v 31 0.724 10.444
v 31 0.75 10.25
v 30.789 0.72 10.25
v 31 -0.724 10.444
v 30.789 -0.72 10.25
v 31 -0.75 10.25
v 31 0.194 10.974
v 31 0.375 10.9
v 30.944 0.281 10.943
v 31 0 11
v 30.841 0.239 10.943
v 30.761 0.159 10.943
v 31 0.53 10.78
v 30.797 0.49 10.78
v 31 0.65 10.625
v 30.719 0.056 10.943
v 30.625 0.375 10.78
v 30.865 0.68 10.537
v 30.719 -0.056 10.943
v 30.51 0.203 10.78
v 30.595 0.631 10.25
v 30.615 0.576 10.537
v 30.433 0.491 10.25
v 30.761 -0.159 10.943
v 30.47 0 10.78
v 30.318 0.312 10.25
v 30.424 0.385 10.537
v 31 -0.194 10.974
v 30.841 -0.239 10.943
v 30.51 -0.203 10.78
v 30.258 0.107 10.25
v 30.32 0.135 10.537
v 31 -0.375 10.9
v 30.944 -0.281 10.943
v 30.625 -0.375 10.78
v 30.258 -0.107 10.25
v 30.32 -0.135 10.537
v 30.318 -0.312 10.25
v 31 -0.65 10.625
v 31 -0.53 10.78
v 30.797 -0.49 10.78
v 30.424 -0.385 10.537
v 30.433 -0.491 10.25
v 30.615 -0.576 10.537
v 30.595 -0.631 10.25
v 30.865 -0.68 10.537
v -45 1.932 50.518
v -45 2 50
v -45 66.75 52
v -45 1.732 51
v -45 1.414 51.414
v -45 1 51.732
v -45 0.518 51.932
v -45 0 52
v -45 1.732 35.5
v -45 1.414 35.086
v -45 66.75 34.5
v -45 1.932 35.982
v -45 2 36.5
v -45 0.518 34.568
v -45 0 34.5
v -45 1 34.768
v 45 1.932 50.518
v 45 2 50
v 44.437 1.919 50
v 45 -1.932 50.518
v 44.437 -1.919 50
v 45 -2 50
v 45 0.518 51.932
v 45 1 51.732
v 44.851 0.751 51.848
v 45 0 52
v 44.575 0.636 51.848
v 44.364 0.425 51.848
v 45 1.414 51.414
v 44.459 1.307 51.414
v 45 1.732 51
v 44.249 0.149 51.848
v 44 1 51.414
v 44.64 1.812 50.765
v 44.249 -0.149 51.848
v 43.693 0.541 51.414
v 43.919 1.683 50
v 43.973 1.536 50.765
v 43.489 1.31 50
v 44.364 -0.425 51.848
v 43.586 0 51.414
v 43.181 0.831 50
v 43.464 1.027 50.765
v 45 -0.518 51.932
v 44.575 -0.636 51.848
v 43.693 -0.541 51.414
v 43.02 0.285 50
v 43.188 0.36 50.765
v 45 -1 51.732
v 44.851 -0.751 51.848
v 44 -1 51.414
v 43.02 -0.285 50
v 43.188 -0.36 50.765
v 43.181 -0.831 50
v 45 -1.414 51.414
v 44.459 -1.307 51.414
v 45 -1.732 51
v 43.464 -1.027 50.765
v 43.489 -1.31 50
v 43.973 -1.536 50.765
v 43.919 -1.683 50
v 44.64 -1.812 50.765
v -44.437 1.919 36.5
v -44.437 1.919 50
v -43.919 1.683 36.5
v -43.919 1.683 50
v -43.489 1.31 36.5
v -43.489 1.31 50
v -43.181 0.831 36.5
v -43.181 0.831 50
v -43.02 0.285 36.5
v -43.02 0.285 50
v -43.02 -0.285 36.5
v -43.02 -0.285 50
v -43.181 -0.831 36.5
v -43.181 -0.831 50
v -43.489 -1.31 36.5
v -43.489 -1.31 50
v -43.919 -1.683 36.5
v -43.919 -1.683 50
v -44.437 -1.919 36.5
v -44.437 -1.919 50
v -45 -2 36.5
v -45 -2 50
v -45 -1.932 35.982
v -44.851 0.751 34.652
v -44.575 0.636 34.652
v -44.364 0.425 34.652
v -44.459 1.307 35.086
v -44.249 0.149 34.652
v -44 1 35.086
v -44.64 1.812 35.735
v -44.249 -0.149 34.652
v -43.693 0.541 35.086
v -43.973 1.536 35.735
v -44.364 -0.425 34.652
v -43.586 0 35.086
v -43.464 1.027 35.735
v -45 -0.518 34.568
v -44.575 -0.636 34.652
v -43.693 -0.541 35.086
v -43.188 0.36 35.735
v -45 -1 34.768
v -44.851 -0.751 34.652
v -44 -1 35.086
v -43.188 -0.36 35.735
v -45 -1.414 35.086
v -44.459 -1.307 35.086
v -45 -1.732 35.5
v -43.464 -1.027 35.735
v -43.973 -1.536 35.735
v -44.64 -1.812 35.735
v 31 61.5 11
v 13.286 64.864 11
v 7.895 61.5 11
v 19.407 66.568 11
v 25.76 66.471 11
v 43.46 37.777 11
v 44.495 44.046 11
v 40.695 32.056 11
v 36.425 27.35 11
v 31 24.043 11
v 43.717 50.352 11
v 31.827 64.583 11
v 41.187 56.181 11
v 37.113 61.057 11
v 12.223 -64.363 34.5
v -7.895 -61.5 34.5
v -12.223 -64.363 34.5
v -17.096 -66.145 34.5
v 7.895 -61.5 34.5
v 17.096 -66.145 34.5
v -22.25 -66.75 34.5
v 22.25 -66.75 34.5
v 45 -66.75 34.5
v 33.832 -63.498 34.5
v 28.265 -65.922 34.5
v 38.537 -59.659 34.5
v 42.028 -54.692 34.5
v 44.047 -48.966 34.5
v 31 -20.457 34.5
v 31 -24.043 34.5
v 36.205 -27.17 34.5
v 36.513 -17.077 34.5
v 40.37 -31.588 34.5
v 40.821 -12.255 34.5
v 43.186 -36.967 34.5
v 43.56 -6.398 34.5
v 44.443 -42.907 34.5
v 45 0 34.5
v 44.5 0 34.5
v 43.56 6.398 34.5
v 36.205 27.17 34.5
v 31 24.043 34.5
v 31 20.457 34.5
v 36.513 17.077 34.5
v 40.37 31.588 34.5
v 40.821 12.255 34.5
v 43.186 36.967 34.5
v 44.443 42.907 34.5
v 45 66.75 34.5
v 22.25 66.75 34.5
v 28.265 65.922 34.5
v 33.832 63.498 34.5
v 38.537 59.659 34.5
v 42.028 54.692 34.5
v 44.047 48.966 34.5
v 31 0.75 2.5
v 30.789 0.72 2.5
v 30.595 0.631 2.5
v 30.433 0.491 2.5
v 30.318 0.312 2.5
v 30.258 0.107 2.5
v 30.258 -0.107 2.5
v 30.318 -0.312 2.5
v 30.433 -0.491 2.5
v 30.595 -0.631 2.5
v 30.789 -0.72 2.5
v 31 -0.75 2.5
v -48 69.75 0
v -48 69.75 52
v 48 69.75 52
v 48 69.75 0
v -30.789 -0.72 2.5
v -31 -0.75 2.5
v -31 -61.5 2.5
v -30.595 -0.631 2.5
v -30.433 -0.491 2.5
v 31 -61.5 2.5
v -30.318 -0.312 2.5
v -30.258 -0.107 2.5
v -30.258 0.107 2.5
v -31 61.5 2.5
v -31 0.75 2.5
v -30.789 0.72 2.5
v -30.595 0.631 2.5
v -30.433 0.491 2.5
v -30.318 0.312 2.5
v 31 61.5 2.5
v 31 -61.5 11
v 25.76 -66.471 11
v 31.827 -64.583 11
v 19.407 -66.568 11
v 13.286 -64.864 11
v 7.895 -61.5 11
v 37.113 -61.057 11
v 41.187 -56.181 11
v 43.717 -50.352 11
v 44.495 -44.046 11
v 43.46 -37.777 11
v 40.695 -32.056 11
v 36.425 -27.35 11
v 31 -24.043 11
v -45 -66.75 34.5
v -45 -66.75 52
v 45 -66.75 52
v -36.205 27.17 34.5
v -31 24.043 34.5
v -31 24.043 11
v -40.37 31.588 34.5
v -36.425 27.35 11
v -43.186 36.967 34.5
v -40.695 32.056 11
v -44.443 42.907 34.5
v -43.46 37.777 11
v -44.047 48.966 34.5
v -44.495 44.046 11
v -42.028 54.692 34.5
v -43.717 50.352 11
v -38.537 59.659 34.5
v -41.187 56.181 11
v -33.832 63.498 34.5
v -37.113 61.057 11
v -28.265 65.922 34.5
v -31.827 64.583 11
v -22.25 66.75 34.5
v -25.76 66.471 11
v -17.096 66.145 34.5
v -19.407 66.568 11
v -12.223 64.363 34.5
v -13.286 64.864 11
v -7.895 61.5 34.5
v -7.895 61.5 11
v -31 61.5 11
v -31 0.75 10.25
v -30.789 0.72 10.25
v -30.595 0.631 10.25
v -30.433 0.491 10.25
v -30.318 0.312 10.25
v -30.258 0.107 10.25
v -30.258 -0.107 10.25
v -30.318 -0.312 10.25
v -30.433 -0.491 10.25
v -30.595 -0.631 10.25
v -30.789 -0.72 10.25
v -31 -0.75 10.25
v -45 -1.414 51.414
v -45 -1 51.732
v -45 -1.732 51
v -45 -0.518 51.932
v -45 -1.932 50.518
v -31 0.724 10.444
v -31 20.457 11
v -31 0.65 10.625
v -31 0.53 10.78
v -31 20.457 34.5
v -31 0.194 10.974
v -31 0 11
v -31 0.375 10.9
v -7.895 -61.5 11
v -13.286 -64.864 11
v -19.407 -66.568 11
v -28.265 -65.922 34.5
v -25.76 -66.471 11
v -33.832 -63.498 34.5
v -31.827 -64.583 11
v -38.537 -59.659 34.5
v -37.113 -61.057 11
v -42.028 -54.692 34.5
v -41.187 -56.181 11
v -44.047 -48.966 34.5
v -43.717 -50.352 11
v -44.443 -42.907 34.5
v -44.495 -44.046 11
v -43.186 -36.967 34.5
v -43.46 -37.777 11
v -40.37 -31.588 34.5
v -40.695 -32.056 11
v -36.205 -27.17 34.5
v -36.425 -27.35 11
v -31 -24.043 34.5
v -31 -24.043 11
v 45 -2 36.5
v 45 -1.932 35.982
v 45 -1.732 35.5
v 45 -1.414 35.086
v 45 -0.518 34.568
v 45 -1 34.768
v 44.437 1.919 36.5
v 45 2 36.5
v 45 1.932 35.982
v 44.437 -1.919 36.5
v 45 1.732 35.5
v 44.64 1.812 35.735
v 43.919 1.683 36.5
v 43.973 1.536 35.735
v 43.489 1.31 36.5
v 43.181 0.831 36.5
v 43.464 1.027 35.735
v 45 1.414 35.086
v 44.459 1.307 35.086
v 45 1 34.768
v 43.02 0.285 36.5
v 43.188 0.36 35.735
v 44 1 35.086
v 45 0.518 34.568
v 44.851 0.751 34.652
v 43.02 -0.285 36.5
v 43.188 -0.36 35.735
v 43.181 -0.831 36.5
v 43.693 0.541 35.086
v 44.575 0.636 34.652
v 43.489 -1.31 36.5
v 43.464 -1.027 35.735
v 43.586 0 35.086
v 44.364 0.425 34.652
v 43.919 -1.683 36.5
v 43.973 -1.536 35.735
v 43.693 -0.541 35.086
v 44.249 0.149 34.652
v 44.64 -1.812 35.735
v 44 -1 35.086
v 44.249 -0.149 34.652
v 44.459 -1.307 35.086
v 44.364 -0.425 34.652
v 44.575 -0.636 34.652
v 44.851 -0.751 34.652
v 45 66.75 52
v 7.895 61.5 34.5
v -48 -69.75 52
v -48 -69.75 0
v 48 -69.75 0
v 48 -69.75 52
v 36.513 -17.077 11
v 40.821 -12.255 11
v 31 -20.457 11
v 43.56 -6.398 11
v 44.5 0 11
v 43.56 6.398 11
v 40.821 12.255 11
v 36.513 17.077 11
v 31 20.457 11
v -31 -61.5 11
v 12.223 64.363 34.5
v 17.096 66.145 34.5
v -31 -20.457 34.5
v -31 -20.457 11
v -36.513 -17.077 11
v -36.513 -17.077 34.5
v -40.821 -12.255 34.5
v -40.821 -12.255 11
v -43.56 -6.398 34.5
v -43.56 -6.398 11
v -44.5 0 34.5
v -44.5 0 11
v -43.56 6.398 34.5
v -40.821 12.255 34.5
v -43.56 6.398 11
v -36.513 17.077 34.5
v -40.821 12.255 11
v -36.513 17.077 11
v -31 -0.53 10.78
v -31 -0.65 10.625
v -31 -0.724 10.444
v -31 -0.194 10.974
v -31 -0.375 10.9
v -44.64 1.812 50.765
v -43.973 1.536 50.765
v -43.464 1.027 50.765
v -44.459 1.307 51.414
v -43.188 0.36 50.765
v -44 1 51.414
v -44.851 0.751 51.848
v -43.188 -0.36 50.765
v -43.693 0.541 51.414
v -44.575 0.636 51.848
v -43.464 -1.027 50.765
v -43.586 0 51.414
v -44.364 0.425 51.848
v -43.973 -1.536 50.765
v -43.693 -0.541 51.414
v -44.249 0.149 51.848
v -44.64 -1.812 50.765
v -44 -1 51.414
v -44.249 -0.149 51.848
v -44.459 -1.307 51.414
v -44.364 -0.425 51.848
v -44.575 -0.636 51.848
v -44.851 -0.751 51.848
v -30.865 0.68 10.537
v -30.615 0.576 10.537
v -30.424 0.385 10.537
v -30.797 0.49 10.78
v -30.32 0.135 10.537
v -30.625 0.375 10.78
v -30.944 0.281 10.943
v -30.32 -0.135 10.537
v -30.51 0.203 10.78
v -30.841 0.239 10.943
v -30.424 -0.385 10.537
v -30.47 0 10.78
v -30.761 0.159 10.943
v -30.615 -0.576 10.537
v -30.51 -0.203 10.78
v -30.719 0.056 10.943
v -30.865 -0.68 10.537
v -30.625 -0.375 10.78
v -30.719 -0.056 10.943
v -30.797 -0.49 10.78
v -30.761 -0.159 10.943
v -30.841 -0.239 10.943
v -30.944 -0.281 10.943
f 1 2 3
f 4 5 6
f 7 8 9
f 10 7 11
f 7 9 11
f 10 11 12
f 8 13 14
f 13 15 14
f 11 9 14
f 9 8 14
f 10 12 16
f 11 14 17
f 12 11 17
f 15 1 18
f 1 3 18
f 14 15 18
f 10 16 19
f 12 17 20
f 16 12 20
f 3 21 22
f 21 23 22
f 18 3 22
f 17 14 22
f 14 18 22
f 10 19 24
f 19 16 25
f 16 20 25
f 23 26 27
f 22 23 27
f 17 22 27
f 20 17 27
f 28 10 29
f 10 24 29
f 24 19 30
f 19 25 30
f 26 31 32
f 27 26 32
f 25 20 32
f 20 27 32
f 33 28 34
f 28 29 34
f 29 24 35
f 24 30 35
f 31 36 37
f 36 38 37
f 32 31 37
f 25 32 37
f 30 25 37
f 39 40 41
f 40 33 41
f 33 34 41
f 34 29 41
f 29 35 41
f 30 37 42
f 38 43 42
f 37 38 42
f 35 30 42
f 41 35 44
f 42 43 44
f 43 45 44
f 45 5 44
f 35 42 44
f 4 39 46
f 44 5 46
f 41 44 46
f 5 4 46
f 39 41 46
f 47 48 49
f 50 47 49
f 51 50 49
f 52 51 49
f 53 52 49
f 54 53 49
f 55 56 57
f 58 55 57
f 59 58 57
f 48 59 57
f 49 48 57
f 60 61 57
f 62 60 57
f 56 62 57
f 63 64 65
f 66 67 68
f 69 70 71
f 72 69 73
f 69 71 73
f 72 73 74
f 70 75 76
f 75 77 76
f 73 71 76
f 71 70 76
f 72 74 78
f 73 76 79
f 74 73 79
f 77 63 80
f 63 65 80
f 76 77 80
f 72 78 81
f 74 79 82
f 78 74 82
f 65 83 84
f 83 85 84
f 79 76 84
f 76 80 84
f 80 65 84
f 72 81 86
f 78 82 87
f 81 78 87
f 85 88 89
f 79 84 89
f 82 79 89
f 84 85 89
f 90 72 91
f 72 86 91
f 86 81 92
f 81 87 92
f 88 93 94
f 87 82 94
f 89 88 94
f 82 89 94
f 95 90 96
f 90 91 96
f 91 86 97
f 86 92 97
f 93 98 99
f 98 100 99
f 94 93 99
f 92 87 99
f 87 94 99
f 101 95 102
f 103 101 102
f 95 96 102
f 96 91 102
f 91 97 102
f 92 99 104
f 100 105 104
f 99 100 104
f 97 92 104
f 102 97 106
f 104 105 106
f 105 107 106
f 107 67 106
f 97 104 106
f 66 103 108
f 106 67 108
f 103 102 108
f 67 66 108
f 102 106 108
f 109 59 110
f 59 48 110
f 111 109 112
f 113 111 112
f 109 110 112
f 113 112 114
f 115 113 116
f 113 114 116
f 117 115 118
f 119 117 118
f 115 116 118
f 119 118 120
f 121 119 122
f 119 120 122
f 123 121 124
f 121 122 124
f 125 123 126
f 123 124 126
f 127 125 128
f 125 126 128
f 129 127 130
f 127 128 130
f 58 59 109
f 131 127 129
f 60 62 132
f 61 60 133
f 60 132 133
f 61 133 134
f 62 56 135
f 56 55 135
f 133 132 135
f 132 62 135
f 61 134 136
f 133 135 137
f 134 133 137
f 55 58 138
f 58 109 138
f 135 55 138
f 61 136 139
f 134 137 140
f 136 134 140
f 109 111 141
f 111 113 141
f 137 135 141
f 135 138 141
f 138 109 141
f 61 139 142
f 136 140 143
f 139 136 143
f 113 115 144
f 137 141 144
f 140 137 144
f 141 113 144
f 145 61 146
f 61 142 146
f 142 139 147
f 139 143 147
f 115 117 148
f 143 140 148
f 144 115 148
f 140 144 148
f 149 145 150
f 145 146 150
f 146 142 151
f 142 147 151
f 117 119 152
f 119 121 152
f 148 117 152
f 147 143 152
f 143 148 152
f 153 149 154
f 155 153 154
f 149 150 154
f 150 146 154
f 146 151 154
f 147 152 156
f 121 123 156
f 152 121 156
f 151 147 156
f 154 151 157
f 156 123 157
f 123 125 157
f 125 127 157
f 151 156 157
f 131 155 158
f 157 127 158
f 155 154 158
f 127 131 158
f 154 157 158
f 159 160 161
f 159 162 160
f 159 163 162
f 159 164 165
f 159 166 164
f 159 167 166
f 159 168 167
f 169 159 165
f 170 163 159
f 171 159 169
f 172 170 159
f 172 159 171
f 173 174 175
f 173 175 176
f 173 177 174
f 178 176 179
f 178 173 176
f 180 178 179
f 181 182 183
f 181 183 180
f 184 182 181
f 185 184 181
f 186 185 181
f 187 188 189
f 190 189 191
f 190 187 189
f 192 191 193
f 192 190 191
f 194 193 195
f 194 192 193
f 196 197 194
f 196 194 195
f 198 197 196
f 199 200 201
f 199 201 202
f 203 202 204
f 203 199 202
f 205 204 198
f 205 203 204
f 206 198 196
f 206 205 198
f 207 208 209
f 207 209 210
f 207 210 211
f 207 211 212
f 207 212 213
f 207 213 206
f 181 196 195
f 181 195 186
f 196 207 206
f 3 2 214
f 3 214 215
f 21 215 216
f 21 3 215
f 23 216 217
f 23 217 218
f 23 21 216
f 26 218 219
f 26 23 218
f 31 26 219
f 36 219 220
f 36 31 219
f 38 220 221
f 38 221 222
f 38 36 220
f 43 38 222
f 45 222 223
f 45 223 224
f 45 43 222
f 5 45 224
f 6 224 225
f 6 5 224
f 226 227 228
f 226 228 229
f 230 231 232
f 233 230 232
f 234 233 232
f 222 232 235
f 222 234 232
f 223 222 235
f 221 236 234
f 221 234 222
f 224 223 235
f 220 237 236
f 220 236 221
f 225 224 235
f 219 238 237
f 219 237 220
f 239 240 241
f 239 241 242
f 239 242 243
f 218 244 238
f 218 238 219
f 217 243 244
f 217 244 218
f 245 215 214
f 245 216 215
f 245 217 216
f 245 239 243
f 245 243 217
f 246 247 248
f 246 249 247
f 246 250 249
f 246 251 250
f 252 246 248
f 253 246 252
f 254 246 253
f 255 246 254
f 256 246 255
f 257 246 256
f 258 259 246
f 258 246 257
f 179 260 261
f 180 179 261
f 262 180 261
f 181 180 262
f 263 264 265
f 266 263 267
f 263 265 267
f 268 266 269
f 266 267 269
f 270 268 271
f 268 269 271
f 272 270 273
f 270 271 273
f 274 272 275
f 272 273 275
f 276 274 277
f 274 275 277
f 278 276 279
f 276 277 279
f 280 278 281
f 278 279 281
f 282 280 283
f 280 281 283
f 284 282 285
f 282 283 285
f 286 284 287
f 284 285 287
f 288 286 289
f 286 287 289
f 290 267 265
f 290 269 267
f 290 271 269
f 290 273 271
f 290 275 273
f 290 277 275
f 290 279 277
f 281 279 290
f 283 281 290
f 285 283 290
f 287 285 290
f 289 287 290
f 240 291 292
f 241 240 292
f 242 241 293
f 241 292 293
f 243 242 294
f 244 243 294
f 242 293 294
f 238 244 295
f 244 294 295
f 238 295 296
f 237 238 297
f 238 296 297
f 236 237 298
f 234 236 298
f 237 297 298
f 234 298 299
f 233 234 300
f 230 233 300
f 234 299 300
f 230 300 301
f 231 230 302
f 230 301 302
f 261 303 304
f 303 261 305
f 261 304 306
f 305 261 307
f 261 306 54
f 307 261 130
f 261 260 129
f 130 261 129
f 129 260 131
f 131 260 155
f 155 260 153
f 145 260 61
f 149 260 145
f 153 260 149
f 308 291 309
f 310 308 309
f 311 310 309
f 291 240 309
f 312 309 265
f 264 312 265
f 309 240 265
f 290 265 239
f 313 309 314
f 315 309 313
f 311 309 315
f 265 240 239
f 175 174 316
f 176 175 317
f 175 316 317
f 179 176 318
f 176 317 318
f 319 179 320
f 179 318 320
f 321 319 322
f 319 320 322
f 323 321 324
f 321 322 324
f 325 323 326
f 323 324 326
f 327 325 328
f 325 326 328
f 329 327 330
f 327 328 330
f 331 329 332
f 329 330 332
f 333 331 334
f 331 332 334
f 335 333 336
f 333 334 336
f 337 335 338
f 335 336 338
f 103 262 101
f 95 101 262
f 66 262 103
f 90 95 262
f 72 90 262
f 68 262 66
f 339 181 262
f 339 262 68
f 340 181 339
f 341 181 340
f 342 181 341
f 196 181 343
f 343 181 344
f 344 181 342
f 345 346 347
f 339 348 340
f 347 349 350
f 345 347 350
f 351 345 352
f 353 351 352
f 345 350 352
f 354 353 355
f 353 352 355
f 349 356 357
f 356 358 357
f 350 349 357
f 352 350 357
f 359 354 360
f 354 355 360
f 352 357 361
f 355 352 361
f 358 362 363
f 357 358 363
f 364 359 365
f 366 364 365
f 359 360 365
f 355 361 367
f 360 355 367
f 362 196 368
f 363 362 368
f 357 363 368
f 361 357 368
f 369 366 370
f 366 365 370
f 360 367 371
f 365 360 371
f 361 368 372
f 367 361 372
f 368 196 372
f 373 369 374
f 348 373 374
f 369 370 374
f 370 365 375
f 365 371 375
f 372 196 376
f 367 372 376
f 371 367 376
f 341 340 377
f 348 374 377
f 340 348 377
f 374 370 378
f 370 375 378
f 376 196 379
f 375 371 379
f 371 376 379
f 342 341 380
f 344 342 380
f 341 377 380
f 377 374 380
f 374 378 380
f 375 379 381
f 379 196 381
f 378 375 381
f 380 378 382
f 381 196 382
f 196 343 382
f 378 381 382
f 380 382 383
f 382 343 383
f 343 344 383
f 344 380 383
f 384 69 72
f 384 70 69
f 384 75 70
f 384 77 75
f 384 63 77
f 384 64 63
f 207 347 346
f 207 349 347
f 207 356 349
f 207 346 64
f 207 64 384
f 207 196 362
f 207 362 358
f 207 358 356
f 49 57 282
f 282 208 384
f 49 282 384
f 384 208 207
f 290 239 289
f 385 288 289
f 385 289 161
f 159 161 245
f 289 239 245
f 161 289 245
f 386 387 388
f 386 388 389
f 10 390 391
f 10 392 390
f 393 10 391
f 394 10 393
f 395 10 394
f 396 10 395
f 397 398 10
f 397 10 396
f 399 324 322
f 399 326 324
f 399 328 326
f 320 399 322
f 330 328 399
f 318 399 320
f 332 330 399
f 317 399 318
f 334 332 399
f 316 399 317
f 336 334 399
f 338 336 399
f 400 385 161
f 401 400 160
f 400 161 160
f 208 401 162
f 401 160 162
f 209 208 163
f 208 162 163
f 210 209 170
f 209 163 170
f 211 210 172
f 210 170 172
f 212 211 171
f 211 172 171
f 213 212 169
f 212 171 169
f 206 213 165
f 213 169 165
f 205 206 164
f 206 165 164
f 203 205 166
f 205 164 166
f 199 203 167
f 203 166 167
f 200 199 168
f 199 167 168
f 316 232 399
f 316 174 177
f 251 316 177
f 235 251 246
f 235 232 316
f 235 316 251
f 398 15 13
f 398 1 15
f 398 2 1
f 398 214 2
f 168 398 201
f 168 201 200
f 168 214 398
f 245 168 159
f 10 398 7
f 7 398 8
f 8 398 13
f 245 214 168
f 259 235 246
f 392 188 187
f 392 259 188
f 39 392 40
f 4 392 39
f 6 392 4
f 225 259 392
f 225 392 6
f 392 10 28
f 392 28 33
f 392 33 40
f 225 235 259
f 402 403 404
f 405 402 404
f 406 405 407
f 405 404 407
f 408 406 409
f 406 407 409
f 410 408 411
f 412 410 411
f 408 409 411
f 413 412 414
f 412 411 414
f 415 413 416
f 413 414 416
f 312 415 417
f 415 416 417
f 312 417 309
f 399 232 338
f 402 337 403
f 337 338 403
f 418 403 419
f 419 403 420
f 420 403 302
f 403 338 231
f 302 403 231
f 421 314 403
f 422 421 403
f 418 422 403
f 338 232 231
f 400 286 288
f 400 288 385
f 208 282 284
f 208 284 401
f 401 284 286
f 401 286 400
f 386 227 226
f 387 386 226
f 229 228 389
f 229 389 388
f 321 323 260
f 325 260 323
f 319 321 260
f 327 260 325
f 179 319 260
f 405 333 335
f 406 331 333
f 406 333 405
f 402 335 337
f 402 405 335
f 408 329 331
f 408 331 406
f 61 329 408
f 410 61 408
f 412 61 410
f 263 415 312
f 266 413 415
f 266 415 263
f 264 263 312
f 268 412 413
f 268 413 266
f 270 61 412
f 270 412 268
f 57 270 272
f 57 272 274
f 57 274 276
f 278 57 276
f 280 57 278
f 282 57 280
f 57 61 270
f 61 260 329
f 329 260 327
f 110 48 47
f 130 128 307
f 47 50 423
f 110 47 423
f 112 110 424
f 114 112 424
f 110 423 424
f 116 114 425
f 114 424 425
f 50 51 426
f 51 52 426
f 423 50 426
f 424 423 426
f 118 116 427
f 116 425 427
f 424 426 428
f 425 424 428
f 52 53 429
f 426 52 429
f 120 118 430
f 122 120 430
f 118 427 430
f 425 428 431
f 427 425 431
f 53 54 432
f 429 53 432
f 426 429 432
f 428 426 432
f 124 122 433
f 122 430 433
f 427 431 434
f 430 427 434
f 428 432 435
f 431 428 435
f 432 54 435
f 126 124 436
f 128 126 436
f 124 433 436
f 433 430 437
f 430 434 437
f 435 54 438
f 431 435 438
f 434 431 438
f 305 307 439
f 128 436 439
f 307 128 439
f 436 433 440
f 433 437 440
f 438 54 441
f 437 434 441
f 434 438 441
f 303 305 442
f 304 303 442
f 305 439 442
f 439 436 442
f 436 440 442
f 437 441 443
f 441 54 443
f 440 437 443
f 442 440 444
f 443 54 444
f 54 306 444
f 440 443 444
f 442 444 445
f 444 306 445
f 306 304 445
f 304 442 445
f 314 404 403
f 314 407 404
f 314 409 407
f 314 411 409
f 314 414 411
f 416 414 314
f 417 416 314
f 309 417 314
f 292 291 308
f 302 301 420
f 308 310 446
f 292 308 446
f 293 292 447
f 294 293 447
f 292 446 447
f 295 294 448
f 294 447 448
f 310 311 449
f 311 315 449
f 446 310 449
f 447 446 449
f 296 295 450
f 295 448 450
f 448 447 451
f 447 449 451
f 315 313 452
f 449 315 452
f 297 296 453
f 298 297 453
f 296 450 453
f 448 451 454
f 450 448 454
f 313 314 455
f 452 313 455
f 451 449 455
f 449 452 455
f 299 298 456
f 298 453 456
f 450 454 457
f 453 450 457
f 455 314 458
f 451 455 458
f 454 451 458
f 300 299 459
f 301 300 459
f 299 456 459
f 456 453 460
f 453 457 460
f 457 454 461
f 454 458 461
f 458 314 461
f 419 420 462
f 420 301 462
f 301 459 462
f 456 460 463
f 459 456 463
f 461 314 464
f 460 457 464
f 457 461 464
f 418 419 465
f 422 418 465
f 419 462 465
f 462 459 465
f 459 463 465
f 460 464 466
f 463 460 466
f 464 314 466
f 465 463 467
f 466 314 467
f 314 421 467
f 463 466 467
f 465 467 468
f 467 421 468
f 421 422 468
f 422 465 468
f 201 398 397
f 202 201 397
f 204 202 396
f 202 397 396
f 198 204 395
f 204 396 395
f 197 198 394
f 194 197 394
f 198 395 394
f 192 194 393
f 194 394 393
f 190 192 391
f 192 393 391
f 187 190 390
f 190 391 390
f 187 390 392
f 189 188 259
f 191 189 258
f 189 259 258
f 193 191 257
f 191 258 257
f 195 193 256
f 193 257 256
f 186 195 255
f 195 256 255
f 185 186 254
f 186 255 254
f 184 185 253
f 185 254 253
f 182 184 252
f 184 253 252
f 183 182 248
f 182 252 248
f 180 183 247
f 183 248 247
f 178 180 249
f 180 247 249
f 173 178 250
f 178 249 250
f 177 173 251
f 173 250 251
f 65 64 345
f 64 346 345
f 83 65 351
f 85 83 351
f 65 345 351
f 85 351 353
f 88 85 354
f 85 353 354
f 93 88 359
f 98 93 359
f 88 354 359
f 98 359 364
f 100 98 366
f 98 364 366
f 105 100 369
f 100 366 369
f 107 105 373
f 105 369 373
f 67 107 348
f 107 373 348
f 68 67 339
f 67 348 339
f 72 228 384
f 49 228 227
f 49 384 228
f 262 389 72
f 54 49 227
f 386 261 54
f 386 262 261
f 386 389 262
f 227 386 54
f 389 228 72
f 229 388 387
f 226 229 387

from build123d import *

# Parameters (mm, degrees)
F0_W      = 94
F0_H      = 137.5
F1_DEPTH  = 2.5
F2_W      = 94
F2_H      = 137.5
F2_W_2    = 62
F2_H_2    = 123
F3_DEPTH  = 8.5
F4_W      = 94
F4_H      = 137.5
F5_DEPTH  = 23.5
F6_W      = 62
F6_H      = 123
F7_DEPTH  = 23.501
F8_W      = 94
F8_H      = 137.5
F8_W_2    = 90
F8_H_2    = 133.5
F9_DEPTH  = 17.5
F11_ANGLE = 180
F13_ANGLE = 180
F14_W     = 0.75
F14_H     = 7.75
F16_W     = 0.75
F16_H     = 7.75
F19_DEPTH = 1
F20_DEPTH = 1
F21_DEPTH = 1
F22_DEPTH = 1


with BuildPart() as f1:
    # F0 (on Top) → F1 (new body)
    with BuildSketch(Plane.XY):
        Rectangle(F0_W, F0_H)
    extrude(amount=F1_DEPTH)

    # F2 (on face) → F3 (join)
    with BuildSketch(Plane.XY.offset(2.5)):
        Rectangle(F2_W, F2_H)
        Rectangle(F2_W_2, F2_H_2, mode=Mode.SUBTRACT)
    extrude(amount=F3_DEPTH)

    # F4 (on face) → F5 (join)
    with BuildSketch(Plane.XY.offset(11)):
        Rectangle(F4_W, F4_H)
        with BuildLine():
            ThreePointArc((-22.25, 22.25), (-37.9831258814, 60.2331258814), (0, 44.5))
            ThreePointArc((0, 44.5), (22.25, 66.75), (44.5, 44.5))
            ThreePointArc((44.5, 44.5), (37.9831258872, 28.7668741244), (22.2500000164, 22.25))
            ThreePointArc((22.2500000164, 22.25), (37.9831258872, 15.7331258756), (44.5, 0))
            ThreePointArc((44.5, 0), (37.9831258814, -15.7331258814), (22.25, -22.25))
            ThreePointArc((22.25, -22.25), (37.9831258814, -28.7668741186), (44.5, -44.5))
            ThreePointArc((44.5, -44.5), (22.25, -66.75), (0, -44.5))
            ThreePointArc((0, -44.5), (-37.983125897, -60.2331258658), (-22.249999956, -22.25))
            ThreePointArc((-22.249999956, -22.25), (-44.5, -2.2e-08), (-22.25, 22.25))
        make_face(mode=Mode.SUBTRACT)
    extrude(amount=F5_DEPTH)

    # F6 (on face) → F7 (cut, through all)
    with BuildSketch(Plane.XY.offset(11)):
        Rectangle(F6_W, F6_H)
    extrude(amount=F7_DEPTH, mode=Mode.SUBTRACT)

    # F8 (on face) → F9 (join)
    with BuildSketch(Plane.XY.offset(34.5)):
        Rectangle(F8_W, F8_H)
        Rectangle(F8_W_2, F8_H_2, mode=Mode.SUBTRACT)
    extrude(amount=F9_DEPTH)

    # F10 (on face) → F11 (revolve)
    with BuildSketch(Plane.YZ.offset(-45)):
        with BuildLine():
            Line((0, 36.5), (0, 34.5))
            ThreePointArc((0, 34.5), (1.4142135624, 35.0857864376), (2, 36.5))
            Line((2, 36.5), (2, 50))
            ThreePointArc((2, 50), (1.4142135624, 51.4142135624), (0, 52))
            Line((0, 52), (0, 50))
            Line((0, 50), (0, 36.5))
        make_face()
    revolve(axis=Axis((-45, 0, 43.25), (0, 0, -1)), revolution_arc=F11_ANGLE)

    # F12 (on face) → F13 (revolve)
    with BuildSketch(Plane(origin=(45, 0, 0), x_dir=(0, -1, 0), z_dir=(-1, 0, 0))):
        with BuildLine():
            ThreePointArc((-2, 36.5), (-1.4142135624, 35.0857864376), (0, 34.5))
            Line((0, 34.5), (0, 36.5))
            Line((0, 36.5), (0, 50))
            Line((0, 50), (-2, 50))
            Line((-2, 50), (-2, 36.5))
        make_face()
        with BuildLine():
            Line((-2, 50), (0, 50))
            Line((0, 50), (0, 52))
            ThreePointArc((0, 52), (-1.4142135624, 51.4142135624), (-2, 50))
        make_face()
    revolve(axis=Axis((45, 0, 43.25), (0, 0, 1)), revolution_arc=F13_ANGLE)

    # F14 (on face) → F15 (revolve)
    with BuildSketch(Plane.YZ.offset(-31)):
        with BuildLine():
            ThreePointArc((0.75, 10.25), (0.5303300859, 10.7803300859), (0, 11))
            Line((0, 11), (0, 10.25))
            Line((0, 10.25), (0.75, 10.25))
        make_face()
        with Locations((0.375, 6.375)):
            Rectangle(F14_W, F14_H)
    revolve(axis=Axis((-31, 0, 6.75), (0, 0, -1)))

    # F16 (on face) → F17 (revolve)
    with BuildSketch(Plane(origin=(31, 0, 0), x_dir=(0, -1, 0), z_dir=(-1, 0, 0))):
        with Locations((-0.375, 6.375)):
            Rectangle(F16_W, F16_H)
        with BuildLine():
            Line((-0.75, 10.25), (0, 10.25))
            Line((0, 10.25), (0, 11))
            ThreePointArc((0, 11), (-0.5303300859, 10.7803300859), (-0.75, 10.25))
        make_face()
    revolve(axis=Axis((31, 0, 6.75), (0, 0, 1)))

    # F19 (add): a face of the model
    f19_faces = [f1.faces().sort_by_distance(p)[0] for p in [
        (47, 0, 26),
    ]]
    extrude(f19_faces, amount=F19_DEPTH)

    # F20 (add): a face of the model
    f20_faces = [f1.faces().sort_by_distance(p)[0] for p in [
        (-47, 0, 26),
    ]]
    extrude(f20_faces, amount=F20_DEPTH)

    # F21 (add): a face of the model
    f21_faces = [f1.faces().sort_by_distance(p)[0] for p in [
        (0, -68.75, 26),
    ]]
    extrude(f21_faces, amount=F21_DEPTH)

    # F22 (add): a face of the model
    f22_faces = [f1.faces().sort_by_distance(p)[0] for p in [
        (0, 68.75, 26),
    ]]
    extrude(f22_faces, amount=F22_DEPTH)


solid = f1.part
